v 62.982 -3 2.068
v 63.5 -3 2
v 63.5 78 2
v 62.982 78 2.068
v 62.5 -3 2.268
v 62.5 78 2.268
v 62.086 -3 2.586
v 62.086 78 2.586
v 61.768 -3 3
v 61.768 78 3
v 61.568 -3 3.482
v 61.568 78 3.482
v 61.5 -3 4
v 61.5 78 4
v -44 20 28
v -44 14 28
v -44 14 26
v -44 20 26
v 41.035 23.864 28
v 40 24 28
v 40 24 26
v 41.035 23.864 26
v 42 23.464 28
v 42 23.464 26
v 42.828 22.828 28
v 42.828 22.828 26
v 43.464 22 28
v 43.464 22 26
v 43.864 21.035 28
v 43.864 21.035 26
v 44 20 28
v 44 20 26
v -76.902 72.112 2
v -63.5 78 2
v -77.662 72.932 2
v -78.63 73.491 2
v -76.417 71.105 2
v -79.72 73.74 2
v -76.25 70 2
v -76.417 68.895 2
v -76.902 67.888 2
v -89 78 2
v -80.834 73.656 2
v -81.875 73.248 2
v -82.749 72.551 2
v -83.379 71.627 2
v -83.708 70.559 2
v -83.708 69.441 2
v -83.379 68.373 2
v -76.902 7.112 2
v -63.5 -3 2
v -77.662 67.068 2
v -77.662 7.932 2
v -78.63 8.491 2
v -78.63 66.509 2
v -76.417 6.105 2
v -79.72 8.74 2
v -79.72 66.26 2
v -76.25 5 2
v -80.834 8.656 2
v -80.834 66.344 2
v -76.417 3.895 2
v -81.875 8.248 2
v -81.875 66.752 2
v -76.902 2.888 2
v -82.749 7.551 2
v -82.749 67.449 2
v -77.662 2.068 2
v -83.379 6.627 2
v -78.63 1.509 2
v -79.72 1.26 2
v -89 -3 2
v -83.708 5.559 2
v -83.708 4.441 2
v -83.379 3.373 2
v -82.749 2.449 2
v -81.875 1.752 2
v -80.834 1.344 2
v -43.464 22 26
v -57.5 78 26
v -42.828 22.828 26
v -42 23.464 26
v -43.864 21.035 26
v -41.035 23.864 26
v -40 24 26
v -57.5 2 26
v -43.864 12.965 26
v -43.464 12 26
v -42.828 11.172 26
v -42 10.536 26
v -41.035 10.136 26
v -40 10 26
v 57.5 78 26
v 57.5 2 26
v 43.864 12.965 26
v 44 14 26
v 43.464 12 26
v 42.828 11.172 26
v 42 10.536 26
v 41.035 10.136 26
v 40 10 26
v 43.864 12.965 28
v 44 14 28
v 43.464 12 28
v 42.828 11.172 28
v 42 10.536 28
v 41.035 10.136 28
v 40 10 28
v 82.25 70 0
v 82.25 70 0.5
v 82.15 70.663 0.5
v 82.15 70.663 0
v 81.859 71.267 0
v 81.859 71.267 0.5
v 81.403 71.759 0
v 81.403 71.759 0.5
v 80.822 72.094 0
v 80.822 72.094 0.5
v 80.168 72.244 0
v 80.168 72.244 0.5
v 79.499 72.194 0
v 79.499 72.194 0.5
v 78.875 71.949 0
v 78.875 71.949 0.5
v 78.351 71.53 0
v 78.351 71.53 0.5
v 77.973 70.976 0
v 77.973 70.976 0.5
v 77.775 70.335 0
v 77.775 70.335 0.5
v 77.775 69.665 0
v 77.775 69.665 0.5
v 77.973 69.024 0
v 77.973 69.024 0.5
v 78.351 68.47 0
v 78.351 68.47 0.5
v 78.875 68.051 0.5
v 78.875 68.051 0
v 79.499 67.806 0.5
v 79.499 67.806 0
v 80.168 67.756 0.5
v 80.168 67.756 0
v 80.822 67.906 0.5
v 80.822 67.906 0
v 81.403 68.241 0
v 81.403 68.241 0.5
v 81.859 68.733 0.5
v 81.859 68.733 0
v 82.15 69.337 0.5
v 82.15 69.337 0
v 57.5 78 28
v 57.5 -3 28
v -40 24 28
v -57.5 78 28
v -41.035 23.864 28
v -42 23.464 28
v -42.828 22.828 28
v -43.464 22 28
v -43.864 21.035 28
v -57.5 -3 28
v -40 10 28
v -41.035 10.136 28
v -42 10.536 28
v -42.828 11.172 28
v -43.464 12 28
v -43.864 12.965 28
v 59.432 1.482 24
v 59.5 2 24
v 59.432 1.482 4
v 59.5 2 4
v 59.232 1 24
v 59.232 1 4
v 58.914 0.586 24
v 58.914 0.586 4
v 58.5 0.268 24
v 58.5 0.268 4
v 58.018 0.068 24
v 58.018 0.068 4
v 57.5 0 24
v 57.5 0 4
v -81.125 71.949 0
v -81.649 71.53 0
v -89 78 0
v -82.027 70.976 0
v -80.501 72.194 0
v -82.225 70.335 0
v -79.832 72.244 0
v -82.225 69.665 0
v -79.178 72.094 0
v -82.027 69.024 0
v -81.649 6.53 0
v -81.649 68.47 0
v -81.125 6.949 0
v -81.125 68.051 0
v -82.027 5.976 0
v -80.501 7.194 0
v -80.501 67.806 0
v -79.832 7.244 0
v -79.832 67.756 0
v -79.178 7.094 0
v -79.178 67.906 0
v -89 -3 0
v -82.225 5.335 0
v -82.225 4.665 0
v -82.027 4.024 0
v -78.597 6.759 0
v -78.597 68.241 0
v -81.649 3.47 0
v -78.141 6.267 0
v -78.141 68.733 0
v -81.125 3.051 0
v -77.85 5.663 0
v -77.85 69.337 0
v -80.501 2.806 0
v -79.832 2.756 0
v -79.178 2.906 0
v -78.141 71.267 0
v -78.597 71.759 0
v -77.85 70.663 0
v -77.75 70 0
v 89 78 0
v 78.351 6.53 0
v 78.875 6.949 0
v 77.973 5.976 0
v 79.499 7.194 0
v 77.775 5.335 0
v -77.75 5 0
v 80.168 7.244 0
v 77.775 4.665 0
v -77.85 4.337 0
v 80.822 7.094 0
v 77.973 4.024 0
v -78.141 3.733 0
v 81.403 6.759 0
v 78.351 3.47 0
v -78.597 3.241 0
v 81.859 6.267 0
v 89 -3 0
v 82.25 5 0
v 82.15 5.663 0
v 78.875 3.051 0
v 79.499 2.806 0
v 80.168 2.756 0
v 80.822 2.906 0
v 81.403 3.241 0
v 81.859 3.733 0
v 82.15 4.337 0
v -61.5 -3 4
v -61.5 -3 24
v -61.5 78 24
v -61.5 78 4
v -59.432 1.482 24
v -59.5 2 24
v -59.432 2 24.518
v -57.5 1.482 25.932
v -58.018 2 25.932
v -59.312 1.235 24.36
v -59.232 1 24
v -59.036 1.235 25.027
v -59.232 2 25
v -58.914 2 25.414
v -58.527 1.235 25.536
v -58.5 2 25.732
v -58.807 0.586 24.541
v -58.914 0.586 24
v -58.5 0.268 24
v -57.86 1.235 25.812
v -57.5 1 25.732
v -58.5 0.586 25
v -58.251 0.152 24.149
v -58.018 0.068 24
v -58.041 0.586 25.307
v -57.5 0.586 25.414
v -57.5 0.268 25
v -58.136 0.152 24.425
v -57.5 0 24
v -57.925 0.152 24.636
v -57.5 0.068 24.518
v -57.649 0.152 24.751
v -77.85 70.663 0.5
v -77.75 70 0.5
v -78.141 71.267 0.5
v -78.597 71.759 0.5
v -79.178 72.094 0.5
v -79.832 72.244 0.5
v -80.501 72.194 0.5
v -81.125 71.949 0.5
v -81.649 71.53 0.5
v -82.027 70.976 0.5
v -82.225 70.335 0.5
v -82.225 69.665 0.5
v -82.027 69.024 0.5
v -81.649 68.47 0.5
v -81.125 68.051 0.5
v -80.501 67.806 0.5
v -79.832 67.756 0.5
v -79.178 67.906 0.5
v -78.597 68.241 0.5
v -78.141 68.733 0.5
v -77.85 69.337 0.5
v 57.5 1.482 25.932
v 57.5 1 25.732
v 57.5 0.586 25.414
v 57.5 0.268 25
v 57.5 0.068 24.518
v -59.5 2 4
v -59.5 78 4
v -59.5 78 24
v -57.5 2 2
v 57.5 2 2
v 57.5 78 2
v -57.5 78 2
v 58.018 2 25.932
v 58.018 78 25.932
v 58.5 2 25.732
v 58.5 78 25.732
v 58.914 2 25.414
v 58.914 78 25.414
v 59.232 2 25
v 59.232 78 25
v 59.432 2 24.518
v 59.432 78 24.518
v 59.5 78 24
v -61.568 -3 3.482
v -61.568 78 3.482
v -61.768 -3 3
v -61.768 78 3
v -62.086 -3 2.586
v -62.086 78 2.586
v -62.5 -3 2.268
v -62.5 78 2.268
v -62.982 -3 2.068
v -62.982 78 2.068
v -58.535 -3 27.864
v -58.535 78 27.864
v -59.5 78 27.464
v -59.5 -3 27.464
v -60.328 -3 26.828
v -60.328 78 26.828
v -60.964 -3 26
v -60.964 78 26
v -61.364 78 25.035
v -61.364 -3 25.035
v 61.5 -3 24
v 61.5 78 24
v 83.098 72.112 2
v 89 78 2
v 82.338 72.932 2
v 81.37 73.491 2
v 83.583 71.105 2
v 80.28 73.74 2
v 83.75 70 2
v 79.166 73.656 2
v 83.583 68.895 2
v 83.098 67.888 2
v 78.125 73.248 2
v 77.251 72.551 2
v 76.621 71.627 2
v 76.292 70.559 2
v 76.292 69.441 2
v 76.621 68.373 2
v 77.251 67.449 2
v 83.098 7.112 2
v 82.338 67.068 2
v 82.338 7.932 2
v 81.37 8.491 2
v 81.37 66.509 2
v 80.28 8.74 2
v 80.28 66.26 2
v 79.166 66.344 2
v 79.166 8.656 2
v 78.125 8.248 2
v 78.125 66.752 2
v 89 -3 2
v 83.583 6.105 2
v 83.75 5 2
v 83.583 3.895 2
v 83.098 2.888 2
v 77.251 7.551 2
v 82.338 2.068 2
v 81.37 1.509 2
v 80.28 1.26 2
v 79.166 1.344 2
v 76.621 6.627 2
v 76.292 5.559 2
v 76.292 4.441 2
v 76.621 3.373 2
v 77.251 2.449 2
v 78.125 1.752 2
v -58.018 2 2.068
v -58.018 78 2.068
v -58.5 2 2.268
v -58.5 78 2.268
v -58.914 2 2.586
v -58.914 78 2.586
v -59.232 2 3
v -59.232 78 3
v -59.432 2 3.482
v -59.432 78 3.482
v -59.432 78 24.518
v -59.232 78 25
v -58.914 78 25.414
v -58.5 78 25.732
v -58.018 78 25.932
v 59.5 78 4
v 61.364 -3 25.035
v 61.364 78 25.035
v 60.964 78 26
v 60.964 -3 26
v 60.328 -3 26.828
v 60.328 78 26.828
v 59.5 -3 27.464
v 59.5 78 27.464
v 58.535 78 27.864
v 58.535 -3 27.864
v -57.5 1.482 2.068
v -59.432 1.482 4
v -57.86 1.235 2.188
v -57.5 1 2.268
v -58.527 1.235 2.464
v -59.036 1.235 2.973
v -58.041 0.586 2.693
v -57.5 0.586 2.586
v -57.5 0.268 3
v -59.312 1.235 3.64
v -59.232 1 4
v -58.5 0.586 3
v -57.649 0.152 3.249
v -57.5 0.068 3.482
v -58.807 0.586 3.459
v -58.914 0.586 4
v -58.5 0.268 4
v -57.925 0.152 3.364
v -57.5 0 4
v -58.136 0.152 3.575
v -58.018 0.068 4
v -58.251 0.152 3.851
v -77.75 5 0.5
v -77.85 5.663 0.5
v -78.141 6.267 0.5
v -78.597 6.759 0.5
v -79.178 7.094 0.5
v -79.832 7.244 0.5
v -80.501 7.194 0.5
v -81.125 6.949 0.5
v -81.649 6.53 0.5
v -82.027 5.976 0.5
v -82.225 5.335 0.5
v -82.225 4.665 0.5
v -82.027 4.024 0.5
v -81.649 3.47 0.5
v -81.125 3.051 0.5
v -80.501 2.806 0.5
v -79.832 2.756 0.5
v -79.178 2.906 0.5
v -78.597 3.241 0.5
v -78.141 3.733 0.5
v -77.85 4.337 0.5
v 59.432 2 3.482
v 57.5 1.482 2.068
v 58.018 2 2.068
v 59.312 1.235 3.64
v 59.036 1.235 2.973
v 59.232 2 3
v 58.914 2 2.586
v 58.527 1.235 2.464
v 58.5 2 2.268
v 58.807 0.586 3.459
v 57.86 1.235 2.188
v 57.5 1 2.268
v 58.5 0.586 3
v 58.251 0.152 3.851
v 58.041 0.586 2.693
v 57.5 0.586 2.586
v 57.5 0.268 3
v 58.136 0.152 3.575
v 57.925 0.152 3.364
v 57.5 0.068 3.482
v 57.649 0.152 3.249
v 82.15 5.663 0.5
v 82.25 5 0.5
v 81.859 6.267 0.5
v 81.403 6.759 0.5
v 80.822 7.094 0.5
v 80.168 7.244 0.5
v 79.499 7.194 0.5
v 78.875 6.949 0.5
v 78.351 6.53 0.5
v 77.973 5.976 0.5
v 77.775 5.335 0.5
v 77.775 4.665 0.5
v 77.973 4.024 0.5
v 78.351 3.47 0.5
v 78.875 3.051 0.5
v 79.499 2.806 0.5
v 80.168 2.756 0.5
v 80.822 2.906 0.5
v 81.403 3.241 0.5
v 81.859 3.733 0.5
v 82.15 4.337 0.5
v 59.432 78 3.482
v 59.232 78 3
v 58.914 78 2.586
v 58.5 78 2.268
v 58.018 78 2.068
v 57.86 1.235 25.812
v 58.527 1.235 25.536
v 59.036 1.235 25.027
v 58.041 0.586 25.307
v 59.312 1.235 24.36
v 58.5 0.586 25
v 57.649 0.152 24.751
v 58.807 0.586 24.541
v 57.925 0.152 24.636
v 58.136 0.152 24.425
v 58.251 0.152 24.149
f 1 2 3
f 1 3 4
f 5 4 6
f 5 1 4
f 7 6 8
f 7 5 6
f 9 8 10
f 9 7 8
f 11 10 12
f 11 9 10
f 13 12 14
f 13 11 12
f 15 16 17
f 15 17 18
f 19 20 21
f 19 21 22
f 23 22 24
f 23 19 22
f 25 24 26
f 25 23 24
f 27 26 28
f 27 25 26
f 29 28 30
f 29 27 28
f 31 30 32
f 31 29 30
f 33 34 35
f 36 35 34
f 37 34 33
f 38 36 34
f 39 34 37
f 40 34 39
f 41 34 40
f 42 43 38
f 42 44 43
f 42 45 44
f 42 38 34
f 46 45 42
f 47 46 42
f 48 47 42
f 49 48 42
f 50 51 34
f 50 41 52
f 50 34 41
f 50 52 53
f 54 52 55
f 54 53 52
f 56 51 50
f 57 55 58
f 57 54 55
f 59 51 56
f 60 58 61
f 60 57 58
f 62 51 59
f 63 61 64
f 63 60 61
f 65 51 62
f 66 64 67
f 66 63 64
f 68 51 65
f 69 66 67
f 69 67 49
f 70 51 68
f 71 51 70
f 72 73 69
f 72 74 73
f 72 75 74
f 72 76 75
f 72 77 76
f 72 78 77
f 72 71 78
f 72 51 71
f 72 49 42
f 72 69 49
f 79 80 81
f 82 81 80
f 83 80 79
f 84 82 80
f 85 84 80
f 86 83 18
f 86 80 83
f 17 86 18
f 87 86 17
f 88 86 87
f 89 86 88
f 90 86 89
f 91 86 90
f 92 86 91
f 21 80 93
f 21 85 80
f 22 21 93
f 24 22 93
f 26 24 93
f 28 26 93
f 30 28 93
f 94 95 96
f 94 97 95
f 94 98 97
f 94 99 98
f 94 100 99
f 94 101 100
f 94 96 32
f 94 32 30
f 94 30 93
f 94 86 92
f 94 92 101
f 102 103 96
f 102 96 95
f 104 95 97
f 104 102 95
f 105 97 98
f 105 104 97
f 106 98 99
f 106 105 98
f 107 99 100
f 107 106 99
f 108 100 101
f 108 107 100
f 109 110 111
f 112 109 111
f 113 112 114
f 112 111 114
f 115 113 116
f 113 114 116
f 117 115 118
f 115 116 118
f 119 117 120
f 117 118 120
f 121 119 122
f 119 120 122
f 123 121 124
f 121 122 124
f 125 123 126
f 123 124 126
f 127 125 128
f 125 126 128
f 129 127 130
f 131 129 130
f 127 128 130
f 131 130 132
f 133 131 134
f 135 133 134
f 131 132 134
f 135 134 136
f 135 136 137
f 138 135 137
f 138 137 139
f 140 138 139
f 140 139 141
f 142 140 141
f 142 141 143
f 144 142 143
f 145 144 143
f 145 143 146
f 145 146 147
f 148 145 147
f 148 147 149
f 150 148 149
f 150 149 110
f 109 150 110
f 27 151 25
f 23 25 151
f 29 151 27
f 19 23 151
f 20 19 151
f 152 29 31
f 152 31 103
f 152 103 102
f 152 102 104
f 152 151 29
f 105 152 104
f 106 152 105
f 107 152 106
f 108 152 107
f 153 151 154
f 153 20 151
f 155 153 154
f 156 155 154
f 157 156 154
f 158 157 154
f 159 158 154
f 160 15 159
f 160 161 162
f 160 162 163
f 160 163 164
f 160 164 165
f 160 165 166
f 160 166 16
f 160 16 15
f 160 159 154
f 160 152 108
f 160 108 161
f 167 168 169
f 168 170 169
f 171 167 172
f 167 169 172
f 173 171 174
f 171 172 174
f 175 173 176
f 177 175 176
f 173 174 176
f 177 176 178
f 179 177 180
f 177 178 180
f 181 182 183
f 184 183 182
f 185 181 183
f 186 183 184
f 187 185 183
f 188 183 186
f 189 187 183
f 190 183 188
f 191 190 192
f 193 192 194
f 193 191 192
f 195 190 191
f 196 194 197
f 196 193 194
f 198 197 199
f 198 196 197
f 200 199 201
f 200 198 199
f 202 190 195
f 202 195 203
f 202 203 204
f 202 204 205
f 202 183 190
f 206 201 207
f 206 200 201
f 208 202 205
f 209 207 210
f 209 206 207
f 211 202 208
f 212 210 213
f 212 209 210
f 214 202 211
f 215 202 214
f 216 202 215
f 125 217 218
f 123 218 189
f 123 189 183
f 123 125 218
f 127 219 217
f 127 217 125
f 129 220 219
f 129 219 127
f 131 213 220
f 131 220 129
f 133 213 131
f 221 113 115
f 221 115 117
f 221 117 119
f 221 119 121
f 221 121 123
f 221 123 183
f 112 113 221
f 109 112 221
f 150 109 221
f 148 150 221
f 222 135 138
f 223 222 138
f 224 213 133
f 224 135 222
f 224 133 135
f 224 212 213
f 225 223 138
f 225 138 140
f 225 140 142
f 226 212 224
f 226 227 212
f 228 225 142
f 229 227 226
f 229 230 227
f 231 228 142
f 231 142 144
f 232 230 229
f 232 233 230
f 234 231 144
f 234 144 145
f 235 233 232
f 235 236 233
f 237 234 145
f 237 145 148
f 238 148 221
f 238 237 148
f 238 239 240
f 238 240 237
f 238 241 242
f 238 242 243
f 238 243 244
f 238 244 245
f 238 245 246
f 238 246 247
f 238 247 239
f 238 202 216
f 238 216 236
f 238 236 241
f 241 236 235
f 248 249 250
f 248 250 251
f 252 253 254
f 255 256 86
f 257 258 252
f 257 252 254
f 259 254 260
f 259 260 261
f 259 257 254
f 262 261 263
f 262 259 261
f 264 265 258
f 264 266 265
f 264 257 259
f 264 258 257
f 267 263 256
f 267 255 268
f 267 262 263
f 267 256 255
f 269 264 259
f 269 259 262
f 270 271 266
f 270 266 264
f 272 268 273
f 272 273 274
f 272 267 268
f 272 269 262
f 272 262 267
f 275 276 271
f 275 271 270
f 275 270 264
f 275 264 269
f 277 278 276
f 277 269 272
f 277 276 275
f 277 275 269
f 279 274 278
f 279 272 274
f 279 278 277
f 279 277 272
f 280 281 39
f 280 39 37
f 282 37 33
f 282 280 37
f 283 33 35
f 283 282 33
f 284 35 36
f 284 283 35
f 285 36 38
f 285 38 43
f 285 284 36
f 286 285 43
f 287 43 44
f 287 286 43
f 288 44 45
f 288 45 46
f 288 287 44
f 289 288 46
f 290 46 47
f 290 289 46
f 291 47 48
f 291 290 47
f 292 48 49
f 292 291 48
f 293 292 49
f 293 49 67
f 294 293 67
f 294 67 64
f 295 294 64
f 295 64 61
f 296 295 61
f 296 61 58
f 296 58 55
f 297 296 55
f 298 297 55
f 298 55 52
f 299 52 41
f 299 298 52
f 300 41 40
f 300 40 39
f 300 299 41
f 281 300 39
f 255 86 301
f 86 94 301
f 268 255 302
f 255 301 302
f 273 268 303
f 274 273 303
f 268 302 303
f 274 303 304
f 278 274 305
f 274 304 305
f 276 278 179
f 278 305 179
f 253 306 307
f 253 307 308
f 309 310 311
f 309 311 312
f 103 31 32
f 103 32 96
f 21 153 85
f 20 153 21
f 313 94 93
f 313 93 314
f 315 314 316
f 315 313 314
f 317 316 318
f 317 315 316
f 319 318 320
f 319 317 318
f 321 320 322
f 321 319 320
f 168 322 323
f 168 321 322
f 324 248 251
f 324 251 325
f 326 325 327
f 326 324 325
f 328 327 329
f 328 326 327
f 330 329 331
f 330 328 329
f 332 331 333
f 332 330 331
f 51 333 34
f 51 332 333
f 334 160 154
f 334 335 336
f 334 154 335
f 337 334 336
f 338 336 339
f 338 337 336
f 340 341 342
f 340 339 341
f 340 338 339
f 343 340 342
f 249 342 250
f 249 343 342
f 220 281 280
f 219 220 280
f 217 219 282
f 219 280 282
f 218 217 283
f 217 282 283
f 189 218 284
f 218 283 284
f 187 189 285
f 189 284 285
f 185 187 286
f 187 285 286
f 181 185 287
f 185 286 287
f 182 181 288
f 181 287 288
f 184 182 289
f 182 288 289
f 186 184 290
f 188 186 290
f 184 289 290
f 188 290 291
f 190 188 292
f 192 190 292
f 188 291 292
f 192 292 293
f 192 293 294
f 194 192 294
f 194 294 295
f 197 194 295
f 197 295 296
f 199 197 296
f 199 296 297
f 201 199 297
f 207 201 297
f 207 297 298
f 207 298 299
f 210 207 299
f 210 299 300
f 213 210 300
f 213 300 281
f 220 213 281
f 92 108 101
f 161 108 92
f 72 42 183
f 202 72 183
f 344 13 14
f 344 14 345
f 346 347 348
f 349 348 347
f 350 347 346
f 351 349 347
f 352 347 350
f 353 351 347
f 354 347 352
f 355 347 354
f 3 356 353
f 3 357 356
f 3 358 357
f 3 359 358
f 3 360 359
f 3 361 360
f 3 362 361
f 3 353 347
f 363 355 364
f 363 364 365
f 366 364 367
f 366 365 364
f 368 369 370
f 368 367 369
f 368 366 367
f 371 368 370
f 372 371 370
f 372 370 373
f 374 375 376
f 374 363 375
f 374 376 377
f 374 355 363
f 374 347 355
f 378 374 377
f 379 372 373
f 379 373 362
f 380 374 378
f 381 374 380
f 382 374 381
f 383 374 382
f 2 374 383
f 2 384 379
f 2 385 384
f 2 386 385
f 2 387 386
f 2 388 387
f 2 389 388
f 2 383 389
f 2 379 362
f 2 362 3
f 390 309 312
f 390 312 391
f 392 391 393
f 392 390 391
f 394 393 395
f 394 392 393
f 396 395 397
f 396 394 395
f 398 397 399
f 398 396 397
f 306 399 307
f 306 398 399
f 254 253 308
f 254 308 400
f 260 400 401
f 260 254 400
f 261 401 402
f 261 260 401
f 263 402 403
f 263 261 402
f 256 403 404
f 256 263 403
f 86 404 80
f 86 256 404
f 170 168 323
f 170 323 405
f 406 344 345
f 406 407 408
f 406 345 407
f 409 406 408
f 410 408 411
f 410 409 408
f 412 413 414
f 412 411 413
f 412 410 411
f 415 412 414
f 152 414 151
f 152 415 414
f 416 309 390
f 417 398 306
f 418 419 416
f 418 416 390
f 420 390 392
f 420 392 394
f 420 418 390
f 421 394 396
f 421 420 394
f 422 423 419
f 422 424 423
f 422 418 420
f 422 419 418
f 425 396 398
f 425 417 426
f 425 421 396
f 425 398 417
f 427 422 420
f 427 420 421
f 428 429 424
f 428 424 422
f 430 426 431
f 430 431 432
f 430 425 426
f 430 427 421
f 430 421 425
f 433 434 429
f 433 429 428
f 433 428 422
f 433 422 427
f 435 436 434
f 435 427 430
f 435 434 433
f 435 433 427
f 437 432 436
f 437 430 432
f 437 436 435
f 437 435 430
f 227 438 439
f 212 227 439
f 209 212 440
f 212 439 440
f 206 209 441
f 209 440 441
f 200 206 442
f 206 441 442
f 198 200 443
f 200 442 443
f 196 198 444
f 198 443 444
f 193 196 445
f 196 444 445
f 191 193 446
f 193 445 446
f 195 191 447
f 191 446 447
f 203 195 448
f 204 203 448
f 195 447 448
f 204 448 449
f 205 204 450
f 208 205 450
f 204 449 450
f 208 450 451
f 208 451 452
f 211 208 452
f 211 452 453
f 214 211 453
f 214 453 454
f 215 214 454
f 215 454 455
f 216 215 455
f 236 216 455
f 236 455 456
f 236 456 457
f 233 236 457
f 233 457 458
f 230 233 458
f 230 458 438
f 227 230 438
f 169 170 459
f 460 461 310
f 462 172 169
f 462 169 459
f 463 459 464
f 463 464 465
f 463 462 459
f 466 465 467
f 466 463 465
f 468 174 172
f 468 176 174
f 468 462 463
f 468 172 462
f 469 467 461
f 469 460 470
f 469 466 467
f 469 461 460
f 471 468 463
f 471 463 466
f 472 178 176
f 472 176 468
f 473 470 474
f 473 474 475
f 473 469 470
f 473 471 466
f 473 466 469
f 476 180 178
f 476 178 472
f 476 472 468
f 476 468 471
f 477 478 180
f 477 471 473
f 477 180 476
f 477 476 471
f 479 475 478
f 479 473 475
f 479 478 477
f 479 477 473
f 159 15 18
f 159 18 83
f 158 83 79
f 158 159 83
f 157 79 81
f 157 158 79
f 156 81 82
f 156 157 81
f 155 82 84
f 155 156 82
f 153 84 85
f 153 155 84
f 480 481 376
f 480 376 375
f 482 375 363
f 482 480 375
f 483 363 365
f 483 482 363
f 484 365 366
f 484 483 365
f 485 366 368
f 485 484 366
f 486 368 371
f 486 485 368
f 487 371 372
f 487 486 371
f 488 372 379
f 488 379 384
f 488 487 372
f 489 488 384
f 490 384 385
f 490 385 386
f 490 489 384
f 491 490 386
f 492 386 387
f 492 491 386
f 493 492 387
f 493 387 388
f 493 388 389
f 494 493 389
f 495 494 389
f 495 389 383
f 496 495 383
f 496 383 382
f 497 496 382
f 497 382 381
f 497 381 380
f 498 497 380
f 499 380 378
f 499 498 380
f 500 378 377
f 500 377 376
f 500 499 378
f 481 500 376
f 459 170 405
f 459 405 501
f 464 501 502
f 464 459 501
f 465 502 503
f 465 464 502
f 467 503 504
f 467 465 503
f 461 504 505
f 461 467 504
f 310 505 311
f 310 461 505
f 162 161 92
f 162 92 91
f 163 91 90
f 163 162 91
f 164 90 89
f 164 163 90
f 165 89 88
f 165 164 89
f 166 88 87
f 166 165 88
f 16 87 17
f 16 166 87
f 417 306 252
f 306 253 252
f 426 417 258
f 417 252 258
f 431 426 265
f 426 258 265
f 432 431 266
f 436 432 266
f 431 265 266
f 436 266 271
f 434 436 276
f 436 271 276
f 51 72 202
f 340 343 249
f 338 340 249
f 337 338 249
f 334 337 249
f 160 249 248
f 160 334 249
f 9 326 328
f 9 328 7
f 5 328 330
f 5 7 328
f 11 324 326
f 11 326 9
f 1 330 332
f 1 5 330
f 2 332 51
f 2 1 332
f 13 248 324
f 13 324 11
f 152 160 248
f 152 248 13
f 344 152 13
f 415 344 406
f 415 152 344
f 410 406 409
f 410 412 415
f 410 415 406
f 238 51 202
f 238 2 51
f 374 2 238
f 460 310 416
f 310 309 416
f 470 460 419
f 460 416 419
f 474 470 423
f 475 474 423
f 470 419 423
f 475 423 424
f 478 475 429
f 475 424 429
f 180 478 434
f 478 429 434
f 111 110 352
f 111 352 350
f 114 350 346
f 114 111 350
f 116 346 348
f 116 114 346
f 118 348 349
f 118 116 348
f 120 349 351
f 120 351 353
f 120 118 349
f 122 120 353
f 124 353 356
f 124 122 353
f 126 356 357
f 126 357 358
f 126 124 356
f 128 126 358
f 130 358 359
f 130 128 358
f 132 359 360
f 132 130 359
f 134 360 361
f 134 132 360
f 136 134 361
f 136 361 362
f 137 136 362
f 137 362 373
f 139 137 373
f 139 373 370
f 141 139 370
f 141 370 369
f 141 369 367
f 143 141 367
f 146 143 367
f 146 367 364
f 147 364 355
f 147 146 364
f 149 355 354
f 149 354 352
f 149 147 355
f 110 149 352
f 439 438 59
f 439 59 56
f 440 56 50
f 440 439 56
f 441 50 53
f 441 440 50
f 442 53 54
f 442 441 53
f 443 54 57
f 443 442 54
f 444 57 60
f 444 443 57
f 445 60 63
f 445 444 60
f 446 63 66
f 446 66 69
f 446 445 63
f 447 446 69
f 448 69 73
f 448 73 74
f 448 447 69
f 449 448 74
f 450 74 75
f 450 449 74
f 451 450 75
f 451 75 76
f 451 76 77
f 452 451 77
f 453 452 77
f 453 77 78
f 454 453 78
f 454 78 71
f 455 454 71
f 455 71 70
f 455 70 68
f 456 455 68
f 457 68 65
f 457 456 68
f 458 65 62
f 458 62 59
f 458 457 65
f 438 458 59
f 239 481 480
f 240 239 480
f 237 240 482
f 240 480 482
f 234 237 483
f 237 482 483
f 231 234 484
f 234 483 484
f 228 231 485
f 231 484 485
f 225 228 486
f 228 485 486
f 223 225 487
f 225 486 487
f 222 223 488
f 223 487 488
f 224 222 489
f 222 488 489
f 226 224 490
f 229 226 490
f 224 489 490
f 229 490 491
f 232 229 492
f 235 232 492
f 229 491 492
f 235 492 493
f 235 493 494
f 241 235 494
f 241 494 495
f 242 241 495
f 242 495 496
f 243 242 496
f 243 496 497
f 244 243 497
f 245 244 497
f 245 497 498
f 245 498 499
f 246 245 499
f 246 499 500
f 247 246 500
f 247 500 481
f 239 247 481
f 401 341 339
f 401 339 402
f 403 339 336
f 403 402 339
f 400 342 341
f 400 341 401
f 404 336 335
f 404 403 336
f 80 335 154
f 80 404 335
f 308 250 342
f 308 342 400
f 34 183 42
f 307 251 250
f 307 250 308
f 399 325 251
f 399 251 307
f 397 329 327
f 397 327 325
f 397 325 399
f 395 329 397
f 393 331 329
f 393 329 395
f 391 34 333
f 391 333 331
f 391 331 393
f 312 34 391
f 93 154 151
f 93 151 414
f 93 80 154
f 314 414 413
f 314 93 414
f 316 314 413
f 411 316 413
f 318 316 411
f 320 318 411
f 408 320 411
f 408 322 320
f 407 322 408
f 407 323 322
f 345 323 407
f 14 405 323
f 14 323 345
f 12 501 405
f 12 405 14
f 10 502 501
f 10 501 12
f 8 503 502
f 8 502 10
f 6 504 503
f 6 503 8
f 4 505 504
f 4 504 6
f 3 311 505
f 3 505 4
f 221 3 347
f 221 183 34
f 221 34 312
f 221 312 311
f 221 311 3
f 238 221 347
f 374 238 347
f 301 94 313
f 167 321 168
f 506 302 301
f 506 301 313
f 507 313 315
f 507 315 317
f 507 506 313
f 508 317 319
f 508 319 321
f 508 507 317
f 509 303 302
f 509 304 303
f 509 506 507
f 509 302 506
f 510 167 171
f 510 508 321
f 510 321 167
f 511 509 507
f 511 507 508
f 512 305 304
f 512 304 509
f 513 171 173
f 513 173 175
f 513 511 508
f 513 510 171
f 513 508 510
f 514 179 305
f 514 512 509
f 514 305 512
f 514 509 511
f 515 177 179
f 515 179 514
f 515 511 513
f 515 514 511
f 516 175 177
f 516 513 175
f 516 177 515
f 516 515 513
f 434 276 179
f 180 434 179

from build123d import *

# Parameters (mm, degrees)
BOSS_EXTRUDE1_DEPTH = 78
BOSS_EXTRUDE2_START = 3
BOSS_EXTRUDE2_DEPTH = 3
CUT_EXTRUDE1_DEPTH  = 2
FILLET1_R           = 2
SKETCH5_R           = 2.25
CUT_EXTRUDE2_DEPTH  = 122.165176515
CHAMFER1_SIZE       = 1.5


with BuildPart() as part:
    # Sketch2 → Boss-Extrude1 (new body)
    with BuildSketch(Plane(origin=(0, 0, 0), x_dir=(1, 0, 0), z_dir=(0, 1, 0))):
        with BuildLine():
            Line((89, 0), (-89, 0))
            Line((-89, 0), (-89, -2))
            Line((-89, -2), (-63.5, -2))
            ThreePointArc((-63.5, -2), (-62.085786438, -2.585786438), (-61.5, -4))
            Line((-61.5, -4), (-61.5, -24))
            ThreePointArc((-61.5, -24), (-60.328427125, -26.828427125), (-57.5, -28))
            Line((-57.5, -28), (57.5, -28))
            ThreePointArc((57.5, -28), (60.328427125, -26.828427125), (61.5, -24))
            Line((61.5, -24), (61.5, -4))
            ThreePointArc((61.5, -4), (62.085786438, -2.585786438), (63.5, -2))
            Line((63.5, -2), (89, -2))
            Line((89, -2), (89, 0))
        make_face()
        with BuildLine():
            Line((57.5, -2), (-57.5, -2))
            ThreePointArc((-57.5, -2), (-58.914213562, -2.585786438), (-59.5, -4))
            Line((-59.5, -4), (-59.5, -24))
            ThreePointArc((-59.5, -24), (-58.914213562, -25.414213562), (-57.5, -26))
            Line((-57.5, -26), (57.5, -26))
            ThreePointArc((57.5, -26), (58.914213562, -25.414213562), (59.5, -24))
            Line((59.5, -24), (59.5, -4))
            ThreePointArc((59.5, -4), (58.914213562, -2.585786438), (57.5, -2))
        make_face(mode=Mode.SUBTRACT)
    extrude(amount=BOSS_EXTRUDE1_DEPTH)

    # Sketch3 → Boss-Extrude2 (add)
    with BuildSketch(Plane.XZ.offset(BOSS_EXTRUDE2_START)):
        with BuildLine():
            Line((-89, 2), (-89, 0))
            Line((-89, 0), (89, 0))
            Line((89, 0), (89, 2))
            Line((89, 2), (63.5, 2))
            ThreePointArc((63.5, 2), (62.085786438, 2.585786438), (61.5, 4))
            Line((61.5, 4), (61.5, 24))
            ThreePointArc((61.5, 24), (60.328427125, 26.828427125), (57.5, 28))
            Line((57.5, 28), (-57.5, 28))
            ThreePointArc((-57.5, 28), (-60.328427125, 26.828427125), (-61.5, 24))
            Line((-61.5, 24), (-61.5, 4))
            ThreePointArc((-61.5, 4), (-62.085786438, 2.585786438), (-63.5, 2))
            Line((-63.5, 2), (-89, 2))
        make_face()
    extrude(amount=-BOSS_EXTRUDE2_DEPTH)

    # Sketch4 → Cut-Extrude1 (cut)
    with BuildSketch(Plane.XY.offset(28)):
        with BuildLine():
            Line((-40, 24), (40, 24))
            ThreePointArc((40, 24), (42.828427125, 22.828427125), (44, 20))
            Line((44, 20), (44, 14))
            ThreePointArc((44, 14), (42.828427125, 11.171572875), (40, 10))
            Line((40, 10), (-40, 10))
            ThreePointArc((-40, 10), (-42.828427125, 11.171572875), (-44, 14))
            Line((-44, 14), (-44, 20))
            ThreePointArc((-44, 20), (-42.828427125, 22.828427125), (-40, 24))
        make_face()
    extrude(amount=-CUT_EXTRUDE1_DEPTH, mode=Mode.SUBTRACT)

    # Fillet1
    fillet1_edges = [part.edges().sort_by_distance(p)[0] for p in [
        (58.914213562, 0, 25.414213562),
        (59.5, 0, 14),
        (58.914213562, 0, 2.585786438),
        (0, 0, 2),
        (-58.914213562, 0, 2.585786438),
        (-59.5, 0, 14),
        (-58.914213562, 0, 25.414213562),
        (0, 0, 26),
    ]]
    fillet(fillet1_edges, radius=FILLET1_R)

    # Sketch5 → Cut-Extrude2 (cut, through all)
    with BuildSketch(Plane.XY.offset(2)):
        with Locations((-80, 70)):
            Circle(SKETCH5_R)
        with Locations((-80, 5)):
            Circle(SKETCH5_R)
        with Locations((80, 5)):
            Circle(SKETCH5_R)
        with Locations((80, 70)):
            Circle(SKETCH5_R)
    extrude(amount=-CUT_EXTRUDE2_DEPTH, mode=Mode.SUBTRACT)

    # Chamfer1
    chamfer1_edges = [part.edges().sort_by_distance(p)[0] for p in [
        (77.75, 70, 2),
        (77.75, 5, 2),
        (-82.25, 5, 2),
        (-82.25, 70, 2),
    ]]
    chamfer(chamfer1_edges, length=CHAMFER1_SIZE)


solid = part.part
